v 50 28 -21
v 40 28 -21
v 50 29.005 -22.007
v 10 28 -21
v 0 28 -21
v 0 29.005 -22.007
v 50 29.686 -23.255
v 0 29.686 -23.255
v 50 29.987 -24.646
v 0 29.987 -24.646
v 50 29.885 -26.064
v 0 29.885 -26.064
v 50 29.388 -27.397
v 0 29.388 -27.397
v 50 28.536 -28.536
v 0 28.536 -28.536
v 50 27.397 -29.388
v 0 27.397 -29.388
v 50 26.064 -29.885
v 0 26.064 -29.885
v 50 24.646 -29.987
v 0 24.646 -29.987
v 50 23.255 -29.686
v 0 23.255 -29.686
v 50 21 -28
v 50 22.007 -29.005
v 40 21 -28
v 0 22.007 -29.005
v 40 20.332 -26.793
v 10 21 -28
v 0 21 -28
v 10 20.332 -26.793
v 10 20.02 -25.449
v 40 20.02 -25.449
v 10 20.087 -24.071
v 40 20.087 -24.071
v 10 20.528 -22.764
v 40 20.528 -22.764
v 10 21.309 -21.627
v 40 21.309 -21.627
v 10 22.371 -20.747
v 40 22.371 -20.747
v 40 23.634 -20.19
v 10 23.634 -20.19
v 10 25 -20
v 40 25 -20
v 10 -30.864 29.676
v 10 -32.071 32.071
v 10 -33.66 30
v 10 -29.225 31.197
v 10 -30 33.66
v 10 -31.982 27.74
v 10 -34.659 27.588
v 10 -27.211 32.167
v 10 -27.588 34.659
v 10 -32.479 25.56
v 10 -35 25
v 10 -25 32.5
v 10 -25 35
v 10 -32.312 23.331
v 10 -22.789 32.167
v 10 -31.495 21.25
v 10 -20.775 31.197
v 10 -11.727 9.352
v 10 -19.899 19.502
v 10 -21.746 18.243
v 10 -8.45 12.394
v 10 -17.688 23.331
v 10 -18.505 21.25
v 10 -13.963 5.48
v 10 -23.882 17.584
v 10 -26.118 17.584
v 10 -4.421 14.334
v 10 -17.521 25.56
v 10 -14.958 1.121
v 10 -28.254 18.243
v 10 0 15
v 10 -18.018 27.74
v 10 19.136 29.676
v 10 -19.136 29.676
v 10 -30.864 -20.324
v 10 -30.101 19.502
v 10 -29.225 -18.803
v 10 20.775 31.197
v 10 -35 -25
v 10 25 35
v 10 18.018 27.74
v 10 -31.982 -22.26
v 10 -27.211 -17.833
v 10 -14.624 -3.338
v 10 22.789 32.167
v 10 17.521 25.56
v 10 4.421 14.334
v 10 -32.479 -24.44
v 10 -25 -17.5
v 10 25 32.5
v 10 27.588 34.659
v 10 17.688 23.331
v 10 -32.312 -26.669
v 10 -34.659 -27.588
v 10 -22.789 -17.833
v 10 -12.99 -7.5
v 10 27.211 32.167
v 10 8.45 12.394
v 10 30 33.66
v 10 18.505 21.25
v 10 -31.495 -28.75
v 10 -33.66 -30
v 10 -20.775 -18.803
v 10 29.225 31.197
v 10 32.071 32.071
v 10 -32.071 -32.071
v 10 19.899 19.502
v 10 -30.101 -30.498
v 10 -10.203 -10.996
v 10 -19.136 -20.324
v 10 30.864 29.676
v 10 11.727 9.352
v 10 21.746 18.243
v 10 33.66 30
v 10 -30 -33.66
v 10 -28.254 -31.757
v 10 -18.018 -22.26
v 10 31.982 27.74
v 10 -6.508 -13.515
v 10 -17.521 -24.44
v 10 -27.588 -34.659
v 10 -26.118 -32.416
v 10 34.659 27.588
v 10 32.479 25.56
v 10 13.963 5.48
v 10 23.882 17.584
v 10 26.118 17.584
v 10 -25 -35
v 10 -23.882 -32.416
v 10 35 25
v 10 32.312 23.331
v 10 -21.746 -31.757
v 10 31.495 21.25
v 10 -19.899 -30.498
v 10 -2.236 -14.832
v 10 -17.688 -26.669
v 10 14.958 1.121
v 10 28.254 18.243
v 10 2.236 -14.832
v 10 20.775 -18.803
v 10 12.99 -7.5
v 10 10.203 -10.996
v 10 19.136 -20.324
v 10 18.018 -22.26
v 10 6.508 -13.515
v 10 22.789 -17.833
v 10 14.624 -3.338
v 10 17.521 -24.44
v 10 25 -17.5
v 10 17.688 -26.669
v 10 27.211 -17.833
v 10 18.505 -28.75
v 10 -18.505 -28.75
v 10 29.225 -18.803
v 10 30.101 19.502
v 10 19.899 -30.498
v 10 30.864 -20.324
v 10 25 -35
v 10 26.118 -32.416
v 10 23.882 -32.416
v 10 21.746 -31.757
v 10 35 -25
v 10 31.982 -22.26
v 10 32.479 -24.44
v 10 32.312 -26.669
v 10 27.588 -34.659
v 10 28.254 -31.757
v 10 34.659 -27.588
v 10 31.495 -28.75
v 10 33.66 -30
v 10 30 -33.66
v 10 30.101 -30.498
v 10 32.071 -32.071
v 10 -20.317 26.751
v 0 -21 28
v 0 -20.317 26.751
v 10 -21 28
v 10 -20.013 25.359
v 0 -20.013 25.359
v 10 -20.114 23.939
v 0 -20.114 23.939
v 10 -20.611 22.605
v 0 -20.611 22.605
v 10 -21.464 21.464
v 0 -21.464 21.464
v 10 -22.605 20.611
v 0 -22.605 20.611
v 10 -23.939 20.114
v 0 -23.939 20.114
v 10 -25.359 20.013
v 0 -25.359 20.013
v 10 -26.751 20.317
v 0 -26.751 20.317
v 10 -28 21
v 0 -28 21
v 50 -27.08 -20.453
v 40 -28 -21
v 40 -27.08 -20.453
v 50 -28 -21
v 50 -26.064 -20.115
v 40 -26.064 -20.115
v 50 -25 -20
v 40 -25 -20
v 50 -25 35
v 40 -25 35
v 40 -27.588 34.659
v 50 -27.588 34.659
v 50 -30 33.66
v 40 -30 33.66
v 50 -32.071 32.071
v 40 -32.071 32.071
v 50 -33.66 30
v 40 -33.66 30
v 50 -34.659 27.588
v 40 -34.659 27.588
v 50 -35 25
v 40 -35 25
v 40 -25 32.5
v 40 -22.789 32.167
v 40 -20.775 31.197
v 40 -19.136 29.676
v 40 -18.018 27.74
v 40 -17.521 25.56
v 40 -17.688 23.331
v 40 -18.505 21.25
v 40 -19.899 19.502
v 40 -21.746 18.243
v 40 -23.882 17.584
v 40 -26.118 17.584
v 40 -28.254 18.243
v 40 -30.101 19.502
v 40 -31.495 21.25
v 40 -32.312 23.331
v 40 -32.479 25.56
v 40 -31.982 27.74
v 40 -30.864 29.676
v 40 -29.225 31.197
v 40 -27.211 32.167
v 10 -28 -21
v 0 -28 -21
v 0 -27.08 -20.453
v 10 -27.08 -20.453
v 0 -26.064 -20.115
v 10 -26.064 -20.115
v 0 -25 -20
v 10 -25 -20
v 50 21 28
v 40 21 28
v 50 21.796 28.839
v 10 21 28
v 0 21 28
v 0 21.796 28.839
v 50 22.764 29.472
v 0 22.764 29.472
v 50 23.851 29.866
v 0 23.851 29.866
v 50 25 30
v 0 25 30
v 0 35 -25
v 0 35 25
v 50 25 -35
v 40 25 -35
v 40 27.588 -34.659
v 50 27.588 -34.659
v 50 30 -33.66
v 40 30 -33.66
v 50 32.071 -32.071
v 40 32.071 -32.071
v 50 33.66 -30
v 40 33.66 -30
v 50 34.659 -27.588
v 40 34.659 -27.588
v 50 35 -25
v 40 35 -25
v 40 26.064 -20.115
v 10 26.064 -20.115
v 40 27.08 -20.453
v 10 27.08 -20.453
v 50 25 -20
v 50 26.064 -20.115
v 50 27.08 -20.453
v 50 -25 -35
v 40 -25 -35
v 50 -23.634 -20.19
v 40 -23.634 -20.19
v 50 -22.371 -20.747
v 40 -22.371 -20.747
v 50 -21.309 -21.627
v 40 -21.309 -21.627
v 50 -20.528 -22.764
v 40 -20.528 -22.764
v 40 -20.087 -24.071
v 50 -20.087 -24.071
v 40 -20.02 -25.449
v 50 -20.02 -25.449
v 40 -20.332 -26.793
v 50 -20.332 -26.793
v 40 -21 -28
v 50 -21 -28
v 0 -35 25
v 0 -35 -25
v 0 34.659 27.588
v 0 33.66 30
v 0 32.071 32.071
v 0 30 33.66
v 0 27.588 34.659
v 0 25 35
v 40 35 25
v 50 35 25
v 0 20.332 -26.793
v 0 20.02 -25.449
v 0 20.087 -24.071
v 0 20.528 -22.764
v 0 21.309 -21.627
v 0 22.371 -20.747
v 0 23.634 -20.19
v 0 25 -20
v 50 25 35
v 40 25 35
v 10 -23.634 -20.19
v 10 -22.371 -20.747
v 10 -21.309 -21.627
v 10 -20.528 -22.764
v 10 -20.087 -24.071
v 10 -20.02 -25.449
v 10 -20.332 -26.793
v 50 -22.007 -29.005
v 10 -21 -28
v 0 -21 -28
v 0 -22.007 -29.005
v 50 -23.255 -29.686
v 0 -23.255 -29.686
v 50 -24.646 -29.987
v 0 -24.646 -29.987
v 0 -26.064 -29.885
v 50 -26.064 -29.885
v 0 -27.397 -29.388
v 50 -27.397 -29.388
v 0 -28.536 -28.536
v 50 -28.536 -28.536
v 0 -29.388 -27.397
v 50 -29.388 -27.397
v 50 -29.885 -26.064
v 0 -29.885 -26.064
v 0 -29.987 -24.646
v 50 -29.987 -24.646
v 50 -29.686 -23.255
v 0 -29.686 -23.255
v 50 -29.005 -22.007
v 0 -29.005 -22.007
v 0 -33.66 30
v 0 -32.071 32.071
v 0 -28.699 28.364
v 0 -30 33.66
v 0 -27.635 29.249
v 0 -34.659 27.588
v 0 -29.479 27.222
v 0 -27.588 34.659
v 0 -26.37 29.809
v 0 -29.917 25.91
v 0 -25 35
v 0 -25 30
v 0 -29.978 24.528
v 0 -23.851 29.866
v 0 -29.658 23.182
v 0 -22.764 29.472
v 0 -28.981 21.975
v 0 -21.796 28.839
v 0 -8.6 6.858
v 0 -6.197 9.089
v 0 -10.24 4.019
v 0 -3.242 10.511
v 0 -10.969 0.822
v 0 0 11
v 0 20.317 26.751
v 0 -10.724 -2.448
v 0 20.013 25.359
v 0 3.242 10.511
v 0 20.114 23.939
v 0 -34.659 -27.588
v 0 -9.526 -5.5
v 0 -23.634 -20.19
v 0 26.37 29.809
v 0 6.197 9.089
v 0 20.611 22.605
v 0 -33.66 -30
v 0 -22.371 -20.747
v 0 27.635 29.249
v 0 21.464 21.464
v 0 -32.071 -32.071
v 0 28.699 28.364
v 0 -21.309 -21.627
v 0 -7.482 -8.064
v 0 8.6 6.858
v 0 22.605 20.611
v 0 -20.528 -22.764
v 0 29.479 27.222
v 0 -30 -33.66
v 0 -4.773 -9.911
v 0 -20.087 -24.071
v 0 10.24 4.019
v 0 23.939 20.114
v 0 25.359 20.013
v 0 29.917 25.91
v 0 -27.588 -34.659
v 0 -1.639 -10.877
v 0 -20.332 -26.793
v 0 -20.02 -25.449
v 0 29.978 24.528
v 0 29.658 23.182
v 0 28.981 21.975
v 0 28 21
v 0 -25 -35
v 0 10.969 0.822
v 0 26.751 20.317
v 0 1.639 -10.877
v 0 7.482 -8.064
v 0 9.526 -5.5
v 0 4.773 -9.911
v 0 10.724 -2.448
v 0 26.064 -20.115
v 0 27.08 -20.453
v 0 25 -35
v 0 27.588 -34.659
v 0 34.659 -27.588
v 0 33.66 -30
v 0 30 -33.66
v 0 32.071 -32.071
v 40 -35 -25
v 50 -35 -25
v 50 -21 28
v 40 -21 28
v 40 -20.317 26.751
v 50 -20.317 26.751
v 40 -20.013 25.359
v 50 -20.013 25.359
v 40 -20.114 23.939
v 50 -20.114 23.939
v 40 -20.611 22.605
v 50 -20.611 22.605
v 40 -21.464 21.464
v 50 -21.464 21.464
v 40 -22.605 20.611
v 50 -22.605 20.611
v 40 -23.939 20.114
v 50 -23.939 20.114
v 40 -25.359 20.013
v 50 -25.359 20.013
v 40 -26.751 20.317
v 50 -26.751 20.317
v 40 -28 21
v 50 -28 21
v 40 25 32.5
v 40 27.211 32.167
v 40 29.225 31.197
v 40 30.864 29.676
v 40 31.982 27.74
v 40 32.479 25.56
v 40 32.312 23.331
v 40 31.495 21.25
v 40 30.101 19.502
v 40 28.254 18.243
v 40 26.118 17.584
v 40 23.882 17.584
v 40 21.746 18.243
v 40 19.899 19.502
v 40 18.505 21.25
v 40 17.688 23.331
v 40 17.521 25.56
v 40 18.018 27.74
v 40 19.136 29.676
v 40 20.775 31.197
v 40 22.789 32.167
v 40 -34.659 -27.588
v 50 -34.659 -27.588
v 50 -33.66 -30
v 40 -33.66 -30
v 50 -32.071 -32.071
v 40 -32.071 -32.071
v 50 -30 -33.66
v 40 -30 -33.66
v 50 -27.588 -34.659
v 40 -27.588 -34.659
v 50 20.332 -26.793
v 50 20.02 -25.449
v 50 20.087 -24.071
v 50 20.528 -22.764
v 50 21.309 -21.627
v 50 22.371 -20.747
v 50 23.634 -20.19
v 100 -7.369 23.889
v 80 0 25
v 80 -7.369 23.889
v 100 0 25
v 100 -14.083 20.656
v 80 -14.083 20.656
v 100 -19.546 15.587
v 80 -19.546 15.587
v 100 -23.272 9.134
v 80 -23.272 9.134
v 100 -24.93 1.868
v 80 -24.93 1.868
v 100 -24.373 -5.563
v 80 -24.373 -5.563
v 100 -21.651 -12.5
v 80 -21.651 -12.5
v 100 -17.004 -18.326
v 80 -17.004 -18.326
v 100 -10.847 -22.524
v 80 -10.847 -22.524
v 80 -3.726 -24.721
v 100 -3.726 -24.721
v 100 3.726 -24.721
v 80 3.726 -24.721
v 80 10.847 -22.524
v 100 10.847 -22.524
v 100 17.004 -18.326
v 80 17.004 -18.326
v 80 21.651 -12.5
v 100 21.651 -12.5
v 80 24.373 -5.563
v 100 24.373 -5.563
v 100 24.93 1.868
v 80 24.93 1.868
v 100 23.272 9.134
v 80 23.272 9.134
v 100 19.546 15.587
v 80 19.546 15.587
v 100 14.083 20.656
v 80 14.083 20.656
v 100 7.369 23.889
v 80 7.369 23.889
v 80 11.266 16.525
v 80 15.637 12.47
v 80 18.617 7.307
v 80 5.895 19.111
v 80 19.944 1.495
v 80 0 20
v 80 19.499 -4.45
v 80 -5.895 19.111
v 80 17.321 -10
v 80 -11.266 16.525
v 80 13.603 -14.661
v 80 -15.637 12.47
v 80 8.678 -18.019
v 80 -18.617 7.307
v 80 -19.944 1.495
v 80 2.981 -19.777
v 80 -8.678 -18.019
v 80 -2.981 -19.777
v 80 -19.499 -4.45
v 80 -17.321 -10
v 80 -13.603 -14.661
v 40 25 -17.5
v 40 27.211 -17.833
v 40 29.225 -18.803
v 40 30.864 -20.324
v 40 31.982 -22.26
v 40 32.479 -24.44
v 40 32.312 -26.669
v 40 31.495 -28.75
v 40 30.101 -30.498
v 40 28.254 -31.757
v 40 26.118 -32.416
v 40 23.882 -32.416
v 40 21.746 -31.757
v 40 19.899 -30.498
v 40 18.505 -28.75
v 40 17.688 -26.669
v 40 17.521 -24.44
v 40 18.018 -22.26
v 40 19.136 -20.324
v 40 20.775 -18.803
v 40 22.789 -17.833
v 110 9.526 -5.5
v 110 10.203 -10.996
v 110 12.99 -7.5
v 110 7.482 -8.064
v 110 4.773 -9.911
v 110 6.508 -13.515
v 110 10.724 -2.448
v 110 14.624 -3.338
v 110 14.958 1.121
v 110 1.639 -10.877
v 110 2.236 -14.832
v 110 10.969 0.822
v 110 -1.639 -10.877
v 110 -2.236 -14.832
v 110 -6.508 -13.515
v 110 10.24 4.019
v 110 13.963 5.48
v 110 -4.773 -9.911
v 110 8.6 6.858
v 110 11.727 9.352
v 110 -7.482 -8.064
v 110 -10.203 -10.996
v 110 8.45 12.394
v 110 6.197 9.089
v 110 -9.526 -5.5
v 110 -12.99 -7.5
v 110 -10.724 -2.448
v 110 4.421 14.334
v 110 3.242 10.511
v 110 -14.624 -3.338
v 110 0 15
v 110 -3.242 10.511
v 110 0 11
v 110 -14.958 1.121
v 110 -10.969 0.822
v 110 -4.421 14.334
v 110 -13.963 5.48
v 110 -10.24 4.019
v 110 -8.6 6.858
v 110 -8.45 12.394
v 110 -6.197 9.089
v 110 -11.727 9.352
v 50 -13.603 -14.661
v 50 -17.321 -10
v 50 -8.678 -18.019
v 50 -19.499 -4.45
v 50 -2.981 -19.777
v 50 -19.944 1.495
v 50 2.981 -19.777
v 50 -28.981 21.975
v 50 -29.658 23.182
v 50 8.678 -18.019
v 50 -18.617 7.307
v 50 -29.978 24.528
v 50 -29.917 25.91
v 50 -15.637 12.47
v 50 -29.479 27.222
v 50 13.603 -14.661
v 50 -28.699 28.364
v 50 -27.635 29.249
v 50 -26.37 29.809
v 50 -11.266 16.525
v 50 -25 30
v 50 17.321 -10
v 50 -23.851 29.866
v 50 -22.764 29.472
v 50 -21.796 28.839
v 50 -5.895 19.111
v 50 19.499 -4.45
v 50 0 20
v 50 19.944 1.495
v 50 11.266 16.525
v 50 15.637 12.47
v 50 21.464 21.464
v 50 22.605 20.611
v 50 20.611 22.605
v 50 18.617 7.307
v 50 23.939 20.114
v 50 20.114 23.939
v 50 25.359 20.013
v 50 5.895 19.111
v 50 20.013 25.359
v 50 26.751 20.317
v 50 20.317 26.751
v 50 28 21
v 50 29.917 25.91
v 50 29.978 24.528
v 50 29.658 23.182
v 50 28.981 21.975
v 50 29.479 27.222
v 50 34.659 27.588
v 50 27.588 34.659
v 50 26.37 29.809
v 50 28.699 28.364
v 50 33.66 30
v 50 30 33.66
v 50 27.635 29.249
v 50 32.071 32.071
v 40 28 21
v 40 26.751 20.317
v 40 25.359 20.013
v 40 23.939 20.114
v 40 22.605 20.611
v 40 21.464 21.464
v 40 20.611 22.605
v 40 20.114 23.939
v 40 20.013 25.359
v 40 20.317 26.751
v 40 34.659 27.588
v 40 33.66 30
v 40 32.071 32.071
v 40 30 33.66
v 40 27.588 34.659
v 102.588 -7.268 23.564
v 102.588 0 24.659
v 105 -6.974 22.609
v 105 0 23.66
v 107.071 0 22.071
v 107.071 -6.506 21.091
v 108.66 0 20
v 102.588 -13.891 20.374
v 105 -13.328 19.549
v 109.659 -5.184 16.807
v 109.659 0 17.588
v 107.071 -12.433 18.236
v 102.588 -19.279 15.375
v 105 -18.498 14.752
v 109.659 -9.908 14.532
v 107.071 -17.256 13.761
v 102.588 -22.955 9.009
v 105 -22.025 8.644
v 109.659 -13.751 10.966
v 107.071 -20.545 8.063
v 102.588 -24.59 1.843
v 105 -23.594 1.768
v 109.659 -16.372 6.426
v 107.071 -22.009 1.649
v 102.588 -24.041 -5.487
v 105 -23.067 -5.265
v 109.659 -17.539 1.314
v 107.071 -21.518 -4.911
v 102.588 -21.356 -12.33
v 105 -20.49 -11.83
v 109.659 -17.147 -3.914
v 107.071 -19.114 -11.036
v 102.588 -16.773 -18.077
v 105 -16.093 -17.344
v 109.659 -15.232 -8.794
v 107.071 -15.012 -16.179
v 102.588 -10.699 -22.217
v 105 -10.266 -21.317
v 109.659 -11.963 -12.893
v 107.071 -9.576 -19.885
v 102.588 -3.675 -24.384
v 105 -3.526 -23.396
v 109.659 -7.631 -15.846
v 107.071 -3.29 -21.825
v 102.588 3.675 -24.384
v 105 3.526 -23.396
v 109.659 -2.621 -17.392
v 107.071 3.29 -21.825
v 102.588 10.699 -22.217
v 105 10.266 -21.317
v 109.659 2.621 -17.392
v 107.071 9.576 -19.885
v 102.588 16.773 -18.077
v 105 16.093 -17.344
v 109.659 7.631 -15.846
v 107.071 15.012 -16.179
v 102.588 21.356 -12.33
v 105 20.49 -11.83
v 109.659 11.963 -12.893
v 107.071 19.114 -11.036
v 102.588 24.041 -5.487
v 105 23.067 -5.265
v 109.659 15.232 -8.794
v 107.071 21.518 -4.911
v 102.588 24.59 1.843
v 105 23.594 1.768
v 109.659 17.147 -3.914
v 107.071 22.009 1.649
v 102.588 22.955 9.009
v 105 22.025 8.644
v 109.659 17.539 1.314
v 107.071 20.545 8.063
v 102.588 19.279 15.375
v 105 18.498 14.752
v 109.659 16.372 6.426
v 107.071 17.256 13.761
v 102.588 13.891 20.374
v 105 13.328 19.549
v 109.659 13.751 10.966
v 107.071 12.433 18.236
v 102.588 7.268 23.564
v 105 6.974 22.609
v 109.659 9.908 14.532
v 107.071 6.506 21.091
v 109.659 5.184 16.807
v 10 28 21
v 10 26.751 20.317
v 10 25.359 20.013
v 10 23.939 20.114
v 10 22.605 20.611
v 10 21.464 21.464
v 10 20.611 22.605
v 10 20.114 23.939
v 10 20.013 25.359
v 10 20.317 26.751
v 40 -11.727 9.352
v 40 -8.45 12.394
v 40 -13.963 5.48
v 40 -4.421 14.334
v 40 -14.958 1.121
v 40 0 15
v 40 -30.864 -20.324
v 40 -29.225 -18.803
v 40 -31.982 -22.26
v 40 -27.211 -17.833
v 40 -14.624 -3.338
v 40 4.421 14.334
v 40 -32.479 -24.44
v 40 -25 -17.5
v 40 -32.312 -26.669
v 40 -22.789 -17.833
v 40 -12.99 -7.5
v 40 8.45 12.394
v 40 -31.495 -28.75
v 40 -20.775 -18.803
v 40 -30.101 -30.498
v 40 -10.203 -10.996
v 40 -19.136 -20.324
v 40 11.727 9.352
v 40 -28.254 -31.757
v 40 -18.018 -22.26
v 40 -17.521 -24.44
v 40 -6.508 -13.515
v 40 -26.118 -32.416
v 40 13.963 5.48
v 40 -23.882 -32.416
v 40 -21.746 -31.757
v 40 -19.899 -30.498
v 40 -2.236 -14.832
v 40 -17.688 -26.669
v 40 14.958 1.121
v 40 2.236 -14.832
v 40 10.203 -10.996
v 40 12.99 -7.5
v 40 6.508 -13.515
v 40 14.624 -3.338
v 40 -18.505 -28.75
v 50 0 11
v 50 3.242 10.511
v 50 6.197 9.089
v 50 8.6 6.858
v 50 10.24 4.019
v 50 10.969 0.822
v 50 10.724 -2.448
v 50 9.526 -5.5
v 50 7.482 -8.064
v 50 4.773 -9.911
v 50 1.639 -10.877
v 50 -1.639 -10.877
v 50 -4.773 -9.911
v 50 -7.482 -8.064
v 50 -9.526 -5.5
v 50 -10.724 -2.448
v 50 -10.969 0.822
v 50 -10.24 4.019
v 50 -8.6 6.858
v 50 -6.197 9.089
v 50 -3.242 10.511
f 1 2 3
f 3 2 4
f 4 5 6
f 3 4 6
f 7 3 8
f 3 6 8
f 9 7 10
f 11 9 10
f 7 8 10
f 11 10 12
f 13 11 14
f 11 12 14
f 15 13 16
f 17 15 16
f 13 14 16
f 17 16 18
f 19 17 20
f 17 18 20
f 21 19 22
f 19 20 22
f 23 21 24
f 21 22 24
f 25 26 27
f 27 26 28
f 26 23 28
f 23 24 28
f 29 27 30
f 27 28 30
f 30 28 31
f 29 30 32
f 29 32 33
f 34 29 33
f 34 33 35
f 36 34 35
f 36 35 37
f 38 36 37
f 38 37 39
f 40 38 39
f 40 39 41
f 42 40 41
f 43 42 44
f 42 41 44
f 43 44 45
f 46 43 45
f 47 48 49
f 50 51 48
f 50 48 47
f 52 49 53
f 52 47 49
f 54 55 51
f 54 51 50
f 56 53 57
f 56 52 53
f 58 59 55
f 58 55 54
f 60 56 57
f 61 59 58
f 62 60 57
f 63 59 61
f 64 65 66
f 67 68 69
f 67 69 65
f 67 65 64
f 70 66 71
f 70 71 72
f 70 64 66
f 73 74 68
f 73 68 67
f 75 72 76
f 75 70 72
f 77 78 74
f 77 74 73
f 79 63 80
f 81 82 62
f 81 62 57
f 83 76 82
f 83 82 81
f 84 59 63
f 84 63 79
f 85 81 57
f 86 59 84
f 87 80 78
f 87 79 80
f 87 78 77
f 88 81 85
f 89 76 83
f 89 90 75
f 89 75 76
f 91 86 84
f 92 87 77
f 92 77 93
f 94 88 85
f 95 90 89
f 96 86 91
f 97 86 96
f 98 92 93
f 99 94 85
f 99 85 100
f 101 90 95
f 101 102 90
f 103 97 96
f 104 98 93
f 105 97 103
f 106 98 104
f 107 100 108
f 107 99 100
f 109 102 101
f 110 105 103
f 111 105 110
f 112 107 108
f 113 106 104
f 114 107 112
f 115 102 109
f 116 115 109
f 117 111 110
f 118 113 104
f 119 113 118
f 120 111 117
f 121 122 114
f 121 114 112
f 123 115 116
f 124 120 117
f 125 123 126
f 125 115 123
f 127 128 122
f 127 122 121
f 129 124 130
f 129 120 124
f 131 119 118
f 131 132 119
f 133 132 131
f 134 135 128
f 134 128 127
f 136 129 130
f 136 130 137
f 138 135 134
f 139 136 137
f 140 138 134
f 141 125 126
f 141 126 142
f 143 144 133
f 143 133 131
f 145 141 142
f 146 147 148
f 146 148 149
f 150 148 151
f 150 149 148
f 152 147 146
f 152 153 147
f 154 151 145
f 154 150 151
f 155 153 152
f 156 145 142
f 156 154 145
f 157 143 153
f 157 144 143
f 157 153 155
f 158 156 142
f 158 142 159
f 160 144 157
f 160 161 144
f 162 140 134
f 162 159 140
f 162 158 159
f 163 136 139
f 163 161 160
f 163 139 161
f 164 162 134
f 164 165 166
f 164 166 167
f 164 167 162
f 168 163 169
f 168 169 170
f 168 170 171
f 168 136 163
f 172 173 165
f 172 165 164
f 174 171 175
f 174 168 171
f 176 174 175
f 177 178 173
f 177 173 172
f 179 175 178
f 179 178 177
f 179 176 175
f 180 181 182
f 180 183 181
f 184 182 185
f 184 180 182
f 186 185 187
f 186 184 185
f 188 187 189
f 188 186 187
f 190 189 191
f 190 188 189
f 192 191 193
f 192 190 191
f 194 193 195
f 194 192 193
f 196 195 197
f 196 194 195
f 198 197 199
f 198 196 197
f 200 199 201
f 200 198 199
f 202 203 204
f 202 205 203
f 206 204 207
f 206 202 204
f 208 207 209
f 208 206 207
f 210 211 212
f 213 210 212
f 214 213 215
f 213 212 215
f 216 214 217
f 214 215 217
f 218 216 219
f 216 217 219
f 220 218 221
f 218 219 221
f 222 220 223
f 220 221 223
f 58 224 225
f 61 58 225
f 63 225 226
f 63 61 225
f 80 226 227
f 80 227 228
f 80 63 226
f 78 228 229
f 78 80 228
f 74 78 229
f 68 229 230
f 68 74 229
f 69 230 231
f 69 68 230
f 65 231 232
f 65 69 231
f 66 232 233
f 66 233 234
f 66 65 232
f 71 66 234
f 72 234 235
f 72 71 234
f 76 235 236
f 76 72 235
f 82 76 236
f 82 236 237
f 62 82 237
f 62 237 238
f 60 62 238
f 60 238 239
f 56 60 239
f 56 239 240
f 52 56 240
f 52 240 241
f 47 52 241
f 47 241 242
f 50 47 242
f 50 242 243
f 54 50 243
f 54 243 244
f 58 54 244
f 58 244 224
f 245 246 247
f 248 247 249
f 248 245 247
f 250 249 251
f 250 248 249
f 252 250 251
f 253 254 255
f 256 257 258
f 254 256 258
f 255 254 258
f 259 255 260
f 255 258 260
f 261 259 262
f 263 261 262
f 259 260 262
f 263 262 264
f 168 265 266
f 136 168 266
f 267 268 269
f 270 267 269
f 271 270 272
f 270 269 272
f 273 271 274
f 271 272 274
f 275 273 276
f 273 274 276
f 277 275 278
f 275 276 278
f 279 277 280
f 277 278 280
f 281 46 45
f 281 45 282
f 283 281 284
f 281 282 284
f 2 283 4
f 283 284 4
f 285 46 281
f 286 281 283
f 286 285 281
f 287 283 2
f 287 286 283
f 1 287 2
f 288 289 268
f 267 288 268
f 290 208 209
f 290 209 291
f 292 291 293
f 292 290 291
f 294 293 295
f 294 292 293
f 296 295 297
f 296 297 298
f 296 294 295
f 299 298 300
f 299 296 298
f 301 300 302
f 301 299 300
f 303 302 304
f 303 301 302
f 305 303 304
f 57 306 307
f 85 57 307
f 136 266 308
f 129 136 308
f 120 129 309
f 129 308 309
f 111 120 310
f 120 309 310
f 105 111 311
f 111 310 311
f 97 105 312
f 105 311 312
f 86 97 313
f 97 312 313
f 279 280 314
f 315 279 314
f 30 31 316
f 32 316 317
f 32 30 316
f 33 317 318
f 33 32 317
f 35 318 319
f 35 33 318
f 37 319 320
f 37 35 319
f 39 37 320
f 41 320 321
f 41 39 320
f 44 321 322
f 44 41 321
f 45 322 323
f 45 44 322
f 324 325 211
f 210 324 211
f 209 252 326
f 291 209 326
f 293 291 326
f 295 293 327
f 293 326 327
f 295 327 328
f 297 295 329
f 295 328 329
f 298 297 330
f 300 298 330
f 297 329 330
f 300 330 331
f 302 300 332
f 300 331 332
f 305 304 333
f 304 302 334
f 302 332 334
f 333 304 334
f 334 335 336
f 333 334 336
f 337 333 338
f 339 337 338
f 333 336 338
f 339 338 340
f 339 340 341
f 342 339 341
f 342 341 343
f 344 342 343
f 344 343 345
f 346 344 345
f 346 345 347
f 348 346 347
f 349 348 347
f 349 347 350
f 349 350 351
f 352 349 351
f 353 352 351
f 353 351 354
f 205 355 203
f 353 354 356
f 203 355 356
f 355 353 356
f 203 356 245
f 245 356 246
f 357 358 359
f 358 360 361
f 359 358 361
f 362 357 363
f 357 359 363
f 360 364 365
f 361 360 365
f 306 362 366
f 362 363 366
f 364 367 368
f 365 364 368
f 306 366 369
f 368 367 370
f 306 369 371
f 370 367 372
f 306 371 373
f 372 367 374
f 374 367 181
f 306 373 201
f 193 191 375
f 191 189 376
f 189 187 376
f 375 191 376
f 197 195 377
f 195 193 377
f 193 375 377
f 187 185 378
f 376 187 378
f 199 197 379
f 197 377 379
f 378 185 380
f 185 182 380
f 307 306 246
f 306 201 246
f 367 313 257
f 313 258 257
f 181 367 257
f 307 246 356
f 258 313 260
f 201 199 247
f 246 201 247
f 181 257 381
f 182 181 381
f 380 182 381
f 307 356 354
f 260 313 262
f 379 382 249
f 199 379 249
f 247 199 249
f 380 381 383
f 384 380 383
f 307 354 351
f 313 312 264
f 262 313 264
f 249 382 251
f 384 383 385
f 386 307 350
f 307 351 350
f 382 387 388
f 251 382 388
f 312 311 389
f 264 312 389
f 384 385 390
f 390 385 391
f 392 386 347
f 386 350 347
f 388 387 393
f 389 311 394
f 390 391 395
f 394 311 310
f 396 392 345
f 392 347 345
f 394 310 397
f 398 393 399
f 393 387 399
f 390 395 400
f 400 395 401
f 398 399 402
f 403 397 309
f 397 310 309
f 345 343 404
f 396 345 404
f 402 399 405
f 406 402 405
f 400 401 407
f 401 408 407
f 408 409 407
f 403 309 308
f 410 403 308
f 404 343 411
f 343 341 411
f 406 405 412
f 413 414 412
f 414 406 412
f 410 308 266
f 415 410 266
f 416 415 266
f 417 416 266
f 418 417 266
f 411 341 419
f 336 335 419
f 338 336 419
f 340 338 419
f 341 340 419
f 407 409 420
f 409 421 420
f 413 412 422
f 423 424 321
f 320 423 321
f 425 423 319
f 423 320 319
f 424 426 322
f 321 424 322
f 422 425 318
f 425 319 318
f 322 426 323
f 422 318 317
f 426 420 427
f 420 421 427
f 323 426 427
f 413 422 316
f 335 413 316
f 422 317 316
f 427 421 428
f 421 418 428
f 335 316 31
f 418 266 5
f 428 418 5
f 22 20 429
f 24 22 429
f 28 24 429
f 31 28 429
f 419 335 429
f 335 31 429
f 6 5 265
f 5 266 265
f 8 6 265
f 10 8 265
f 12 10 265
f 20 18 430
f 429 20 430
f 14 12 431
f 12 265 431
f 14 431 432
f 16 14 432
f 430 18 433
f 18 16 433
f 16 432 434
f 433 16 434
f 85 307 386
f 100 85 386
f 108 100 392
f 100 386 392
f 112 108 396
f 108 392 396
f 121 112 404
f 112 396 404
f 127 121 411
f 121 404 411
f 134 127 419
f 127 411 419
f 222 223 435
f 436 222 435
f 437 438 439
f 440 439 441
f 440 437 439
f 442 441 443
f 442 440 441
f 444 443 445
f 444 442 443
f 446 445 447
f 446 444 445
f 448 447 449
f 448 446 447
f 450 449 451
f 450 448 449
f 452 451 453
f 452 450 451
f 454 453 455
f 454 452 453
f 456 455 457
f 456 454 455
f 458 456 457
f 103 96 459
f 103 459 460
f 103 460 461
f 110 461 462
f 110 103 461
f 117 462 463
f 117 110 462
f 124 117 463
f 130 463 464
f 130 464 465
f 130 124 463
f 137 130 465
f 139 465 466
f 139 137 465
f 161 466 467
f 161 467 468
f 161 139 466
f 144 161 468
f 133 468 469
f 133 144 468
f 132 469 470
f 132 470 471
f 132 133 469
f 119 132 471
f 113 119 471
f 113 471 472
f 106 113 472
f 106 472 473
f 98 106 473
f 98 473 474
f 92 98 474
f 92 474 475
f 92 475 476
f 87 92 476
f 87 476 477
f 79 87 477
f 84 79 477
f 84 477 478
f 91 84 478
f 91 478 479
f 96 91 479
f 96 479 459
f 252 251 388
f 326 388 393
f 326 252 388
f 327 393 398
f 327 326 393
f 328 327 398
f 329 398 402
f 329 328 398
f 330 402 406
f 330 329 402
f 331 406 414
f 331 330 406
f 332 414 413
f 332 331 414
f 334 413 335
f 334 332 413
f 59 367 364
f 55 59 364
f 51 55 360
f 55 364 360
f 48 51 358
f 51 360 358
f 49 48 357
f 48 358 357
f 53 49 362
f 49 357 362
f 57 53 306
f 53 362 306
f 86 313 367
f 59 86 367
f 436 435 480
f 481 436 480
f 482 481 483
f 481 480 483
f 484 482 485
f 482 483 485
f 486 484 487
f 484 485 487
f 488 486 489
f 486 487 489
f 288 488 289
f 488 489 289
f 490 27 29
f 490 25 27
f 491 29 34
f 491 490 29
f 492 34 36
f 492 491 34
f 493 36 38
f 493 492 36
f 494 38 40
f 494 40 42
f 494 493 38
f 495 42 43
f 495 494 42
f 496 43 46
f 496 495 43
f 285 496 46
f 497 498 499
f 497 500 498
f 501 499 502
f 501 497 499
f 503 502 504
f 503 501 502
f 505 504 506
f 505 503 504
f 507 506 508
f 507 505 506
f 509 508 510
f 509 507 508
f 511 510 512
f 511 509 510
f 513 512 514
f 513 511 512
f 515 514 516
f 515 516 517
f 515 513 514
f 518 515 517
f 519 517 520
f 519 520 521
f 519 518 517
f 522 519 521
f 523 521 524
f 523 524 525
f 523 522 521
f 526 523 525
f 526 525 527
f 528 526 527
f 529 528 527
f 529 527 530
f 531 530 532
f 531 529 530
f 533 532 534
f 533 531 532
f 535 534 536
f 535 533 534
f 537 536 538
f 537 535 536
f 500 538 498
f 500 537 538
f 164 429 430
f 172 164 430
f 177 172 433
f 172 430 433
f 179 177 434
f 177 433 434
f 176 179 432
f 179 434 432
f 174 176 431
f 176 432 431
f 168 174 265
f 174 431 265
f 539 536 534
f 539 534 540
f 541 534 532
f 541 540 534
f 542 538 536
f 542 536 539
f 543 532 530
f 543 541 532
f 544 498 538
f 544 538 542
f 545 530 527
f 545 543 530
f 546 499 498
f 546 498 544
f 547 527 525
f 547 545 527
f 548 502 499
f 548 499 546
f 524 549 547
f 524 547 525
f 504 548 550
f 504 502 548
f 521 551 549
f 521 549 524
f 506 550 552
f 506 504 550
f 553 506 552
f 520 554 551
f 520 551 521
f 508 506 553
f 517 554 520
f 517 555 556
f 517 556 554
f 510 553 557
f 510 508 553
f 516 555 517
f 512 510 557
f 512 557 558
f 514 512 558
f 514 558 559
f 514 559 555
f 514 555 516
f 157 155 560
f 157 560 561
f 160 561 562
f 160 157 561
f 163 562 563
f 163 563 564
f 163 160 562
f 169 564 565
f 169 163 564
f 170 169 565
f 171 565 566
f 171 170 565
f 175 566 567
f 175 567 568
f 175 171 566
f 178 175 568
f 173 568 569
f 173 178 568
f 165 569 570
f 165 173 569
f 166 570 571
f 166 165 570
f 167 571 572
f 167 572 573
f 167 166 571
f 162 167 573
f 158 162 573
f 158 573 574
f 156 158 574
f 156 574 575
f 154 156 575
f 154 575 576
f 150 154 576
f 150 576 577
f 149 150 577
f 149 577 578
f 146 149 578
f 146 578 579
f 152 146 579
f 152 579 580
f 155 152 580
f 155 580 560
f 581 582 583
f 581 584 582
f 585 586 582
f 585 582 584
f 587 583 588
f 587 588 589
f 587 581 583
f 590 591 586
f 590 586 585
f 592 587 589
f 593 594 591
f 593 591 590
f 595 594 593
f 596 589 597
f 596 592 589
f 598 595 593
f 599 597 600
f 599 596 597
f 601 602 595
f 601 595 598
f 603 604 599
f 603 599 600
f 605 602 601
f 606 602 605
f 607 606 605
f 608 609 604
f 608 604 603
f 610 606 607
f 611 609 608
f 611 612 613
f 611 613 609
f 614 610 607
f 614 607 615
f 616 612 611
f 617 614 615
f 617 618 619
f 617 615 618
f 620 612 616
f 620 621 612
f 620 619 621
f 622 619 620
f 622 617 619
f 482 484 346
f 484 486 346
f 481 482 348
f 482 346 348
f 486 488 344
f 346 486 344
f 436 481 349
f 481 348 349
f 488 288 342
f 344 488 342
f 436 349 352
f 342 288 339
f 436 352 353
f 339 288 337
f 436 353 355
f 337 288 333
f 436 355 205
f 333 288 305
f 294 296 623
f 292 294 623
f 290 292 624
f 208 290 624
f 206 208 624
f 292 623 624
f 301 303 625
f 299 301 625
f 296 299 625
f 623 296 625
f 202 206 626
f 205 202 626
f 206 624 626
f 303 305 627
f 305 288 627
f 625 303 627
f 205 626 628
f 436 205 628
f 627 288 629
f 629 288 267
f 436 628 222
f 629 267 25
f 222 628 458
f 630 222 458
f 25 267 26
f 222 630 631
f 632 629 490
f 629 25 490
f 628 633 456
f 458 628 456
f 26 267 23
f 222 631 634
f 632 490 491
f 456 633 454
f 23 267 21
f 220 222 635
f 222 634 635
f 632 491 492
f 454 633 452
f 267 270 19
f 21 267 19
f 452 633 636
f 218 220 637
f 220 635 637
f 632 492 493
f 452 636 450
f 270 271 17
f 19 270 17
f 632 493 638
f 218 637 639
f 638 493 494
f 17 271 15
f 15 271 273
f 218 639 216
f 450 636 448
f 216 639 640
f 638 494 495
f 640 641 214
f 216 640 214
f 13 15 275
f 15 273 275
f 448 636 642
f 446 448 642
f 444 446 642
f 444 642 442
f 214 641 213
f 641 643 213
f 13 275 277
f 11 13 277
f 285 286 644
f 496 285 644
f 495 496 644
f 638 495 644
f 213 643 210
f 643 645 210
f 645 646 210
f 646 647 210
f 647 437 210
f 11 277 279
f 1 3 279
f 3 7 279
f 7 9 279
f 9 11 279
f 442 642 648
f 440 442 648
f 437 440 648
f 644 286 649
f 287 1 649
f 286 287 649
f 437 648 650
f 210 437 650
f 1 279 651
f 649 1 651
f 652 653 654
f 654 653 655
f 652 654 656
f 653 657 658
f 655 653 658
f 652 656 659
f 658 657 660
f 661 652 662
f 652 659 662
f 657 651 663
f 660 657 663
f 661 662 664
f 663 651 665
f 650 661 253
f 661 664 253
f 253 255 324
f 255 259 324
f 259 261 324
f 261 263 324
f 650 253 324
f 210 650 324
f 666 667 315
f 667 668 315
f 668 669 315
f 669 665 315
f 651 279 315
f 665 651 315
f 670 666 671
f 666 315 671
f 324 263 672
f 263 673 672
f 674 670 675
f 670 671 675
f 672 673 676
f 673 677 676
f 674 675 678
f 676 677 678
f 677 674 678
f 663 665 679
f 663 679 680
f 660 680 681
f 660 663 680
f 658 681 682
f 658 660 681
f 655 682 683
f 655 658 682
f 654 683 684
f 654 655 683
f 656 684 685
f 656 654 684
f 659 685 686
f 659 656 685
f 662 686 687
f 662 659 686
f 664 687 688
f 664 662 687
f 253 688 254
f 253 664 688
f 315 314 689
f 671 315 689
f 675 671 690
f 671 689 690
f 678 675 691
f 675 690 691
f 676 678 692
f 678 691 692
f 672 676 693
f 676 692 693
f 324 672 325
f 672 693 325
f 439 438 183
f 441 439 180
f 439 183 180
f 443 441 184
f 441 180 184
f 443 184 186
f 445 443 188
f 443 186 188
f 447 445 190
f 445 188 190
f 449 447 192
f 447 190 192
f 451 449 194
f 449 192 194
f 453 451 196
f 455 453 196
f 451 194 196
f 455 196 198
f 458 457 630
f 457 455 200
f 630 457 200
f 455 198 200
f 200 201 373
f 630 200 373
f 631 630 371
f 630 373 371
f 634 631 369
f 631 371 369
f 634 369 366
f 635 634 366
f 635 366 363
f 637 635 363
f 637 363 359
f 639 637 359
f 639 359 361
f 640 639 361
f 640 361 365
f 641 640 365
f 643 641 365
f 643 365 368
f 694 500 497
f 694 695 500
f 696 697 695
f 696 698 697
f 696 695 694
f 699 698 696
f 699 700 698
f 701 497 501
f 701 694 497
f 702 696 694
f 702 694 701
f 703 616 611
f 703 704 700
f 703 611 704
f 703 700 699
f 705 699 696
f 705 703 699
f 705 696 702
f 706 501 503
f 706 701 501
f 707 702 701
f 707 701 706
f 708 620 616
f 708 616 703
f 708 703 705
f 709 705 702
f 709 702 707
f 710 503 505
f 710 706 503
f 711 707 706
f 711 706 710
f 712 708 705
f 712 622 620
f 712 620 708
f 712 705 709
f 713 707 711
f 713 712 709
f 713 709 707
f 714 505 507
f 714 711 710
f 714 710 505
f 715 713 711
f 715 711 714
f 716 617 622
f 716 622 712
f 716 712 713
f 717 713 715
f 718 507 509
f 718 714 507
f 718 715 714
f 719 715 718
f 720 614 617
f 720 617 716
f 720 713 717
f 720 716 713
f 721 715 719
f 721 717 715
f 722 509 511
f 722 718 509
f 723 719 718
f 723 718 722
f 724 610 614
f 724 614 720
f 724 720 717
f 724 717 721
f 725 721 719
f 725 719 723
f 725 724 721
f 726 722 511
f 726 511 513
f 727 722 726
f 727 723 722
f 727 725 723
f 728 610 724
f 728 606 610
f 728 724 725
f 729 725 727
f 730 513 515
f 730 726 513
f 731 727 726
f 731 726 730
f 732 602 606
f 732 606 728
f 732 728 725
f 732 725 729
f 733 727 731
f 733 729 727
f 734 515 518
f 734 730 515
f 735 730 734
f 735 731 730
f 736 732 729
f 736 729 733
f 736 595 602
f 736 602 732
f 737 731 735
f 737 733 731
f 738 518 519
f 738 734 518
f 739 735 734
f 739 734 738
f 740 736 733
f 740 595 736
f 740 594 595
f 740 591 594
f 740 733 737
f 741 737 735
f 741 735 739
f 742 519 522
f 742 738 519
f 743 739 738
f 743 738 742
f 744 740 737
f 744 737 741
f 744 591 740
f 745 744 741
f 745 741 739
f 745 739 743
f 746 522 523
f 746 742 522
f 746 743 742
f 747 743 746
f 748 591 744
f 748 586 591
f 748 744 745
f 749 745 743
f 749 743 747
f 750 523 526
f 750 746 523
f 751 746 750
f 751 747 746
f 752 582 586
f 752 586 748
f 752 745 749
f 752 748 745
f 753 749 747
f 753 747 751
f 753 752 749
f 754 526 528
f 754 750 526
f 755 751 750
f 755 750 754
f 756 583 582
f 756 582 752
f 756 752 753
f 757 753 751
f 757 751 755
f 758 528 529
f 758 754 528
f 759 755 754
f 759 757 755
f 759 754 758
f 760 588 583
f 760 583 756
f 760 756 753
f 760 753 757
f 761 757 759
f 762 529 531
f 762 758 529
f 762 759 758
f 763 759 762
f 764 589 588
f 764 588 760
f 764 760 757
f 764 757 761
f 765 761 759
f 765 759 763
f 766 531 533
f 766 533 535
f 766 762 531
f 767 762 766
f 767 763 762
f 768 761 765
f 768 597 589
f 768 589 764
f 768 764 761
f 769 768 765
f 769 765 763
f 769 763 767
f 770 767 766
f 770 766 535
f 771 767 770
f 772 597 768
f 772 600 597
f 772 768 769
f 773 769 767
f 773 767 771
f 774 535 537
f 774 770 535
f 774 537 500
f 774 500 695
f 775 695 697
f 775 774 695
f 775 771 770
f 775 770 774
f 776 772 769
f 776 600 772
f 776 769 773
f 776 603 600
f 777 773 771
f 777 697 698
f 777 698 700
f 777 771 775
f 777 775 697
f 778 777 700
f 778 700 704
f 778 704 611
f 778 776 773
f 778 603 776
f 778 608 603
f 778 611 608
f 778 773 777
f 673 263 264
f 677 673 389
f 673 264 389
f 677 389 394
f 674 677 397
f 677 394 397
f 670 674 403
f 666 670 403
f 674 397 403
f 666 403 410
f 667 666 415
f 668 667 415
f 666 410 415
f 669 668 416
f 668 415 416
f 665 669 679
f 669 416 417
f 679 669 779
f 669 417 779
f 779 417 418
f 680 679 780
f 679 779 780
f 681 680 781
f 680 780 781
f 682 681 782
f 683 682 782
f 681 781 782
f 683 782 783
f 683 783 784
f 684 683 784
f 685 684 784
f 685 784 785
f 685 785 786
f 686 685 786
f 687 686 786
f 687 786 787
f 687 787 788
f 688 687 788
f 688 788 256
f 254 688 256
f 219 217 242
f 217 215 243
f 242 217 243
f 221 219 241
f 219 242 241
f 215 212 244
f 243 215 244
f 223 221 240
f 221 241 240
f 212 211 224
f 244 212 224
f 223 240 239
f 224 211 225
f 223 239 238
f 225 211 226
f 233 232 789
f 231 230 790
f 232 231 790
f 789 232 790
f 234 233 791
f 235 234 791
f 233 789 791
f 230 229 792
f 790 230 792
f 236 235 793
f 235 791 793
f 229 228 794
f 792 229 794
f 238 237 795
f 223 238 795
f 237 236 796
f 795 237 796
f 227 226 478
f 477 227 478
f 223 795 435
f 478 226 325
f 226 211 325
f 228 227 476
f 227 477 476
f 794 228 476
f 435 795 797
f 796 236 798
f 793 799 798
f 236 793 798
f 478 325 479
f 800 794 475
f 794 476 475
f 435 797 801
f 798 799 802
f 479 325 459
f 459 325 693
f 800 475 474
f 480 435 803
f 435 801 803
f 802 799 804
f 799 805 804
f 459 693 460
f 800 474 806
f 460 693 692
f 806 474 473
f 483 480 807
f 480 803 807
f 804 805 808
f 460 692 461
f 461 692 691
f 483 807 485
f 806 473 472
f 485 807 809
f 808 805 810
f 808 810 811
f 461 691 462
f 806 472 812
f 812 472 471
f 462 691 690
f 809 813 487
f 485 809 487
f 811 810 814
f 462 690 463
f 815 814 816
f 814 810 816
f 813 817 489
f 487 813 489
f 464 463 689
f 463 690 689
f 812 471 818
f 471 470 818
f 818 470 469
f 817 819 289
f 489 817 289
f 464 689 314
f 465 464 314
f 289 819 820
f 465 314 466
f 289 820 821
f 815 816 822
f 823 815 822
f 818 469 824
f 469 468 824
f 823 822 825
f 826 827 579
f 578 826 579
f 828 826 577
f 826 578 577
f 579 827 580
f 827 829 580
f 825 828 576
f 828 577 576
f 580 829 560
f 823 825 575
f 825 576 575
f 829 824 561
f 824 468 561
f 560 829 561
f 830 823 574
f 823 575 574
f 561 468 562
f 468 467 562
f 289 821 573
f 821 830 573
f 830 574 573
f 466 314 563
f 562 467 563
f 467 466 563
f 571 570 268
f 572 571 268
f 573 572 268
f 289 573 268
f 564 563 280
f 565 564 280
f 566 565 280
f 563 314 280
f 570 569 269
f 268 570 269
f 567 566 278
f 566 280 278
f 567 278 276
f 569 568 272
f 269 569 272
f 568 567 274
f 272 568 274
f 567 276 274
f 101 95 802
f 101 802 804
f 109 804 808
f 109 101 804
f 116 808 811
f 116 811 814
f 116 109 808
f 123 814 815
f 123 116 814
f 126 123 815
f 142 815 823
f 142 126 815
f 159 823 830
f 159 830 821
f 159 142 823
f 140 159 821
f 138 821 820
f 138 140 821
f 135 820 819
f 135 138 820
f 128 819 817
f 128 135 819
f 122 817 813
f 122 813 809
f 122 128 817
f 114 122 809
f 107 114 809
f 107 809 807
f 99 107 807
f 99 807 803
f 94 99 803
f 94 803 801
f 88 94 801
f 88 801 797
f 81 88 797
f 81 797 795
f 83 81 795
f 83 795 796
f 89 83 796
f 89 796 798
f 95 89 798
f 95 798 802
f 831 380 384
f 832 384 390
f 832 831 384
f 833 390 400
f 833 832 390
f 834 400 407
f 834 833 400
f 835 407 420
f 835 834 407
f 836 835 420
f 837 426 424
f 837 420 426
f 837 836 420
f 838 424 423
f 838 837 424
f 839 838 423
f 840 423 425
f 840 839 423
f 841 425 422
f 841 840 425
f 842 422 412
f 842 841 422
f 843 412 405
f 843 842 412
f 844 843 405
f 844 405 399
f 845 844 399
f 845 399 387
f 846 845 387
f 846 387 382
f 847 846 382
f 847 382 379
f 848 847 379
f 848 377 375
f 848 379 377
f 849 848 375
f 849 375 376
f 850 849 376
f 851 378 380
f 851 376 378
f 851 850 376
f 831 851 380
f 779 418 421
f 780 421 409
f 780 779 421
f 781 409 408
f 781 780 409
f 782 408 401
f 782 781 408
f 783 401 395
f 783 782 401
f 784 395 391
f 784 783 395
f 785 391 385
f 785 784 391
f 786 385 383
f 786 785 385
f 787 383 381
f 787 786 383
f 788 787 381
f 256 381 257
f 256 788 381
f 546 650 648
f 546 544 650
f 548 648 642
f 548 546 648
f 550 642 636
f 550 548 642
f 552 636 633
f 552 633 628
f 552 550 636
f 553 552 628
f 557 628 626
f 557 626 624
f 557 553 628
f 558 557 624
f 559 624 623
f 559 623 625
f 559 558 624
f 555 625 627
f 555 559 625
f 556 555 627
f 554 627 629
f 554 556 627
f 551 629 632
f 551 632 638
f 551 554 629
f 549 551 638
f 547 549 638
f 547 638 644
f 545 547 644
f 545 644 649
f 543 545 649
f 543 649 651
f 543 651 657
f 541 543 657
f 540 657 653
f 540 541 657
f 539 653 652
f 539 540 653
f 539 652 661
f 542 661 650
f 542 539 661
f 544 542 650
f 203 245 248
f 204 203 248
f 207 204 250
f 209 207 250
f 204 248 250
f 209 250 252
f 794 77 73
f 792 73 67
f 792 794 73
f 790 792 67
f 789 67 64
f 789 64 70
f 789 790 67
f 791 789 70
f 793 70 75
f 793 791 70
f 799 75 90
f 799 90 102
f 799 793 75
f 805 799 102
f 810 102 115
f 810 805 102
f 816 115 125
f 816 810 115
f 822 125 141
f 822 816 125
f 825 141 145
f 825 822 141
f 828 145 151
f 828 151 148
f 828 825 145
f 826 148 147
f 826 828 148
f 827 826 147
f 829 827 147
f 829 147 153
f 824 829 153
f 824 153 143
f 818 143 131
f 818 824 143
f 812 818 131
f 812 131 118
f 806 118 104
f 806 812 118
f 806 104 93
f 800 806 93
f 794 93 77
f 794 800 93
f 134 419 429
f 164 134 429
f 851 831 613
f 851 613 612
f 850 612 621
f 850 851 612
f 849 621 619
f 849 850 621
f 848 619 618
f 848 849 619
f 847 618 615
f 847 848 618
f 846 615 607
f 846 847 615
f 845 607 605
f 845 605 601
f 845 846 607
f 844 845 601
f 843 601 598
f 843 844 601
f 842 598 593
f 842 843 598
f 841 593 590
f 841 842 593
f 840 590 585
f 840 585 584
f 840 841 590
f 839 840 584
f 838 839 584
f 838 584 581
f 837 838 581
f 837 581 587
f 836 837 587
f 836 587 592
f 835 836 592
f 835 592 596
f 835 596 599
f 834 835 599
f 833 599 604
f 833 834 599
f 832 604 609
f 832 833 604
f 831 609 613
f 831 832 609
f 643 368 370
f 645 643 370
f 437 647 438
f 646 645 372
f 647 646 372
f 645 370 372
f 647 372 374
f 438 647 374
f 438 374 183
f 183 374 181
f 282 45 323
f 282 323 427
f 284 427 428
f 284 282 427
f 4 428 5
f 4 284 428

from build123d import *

# Parameters (mm, degrees)
SKETCH_2_R               = 7.5
EXTRUDE_1_DEPTH          = 10
EXTRUDE_START            = -40
SKETCH_2_3_R             = 7.5
EXTRUDE_2_DEPTH          = 10
SKETCH_3_R               = 7.5
SKETCH_3_R_2             = 5
SKETCH_3_R_3             = 11
EXTRUDE_3_DEPTH          = 50
CUT_EXTRUDE_2_DEPTH      = 121.623380818
CUT_EXTRUDE_2_DEPTH_BACK = 121.623380818
SKETCH_6_R               = 5
SKETCH_6_R_2             = 11


with BuildPart() as part:
    # Эскиз1 → Повернуть1 (revolve)
    with BuildSketch(Plane.XY):
        with BuildLine():
            Line((0, -11), (0, -35))
            Line((0, -35), (10, -35))
            Line((10, -35), (10, -15))
            Line((10, -15), (40, -15))
            Line((40, -15), (40, -35))
            Line((40, -35), (50, -35))
            Line((50, -35), (50, -20))
            Line((50, -20), (80, -20))
            Line((80, -20), (80, -25))
            Line((80, -25), (100, -25))
            ThreePointArc((100, -25), (107.071067812, -22.071067812), (110, -15))
            Line((110, -15), (110, -11))
            Line((110, -11), (0, -11))
        make_face()
    revolve(axis=Axis((0, 0, 0), (1, 0, 0)))

    # Эскиз2 → Бобышка-Вытянуть1 (add)
    with BuildSketch(Plane.ZY):
        with BuildLine():
            Line((-25, 35), (25, 35))
            ThreePointArc((25, 35), (32.071067812, 32.071067812), (35, 25))
            Line((35, 25), (35, -25))
            ThreePointArc((35, -25), (32.071067812, -32.071067812), (25, -35))
            Line((25, -35), (-25, -35))
            ThreePointArc((-25, -35), (-32.071067812, -32.071067812), (-35, -25))
            Line((-35, -25), (-35, 25))
            ThreePointArc((-35, 25), (-32.071067812, 32.071067812), (-25, 35))
        make_face()
        with Locations((25, 25)):
            Circle(SKETCH_2_R, mode=Mode.SUBTRACT)
        with Locations((-25, 25)):
            Circle(SKETCH_2_R, mode=Mode.SUBTRACT)
        with Locations((-25, -25)):
            Circle(SKETCH_2_R, mode=Mode.SUBTRACT)
        with Locations((25, -25)):
            Circle(SKETCH_2_R, mode=Mode.SUBTRACT)
    extrude(amount=-EXTRUDE_1_DEPTH)

    # Эскиз2<3> → Бобышка-Вытянуть2 (add)
    with BuildSketch(Plane.ZY.offset(EXTRUDE_START)):
        with BuildLine():
            Line((-25, 35), (25, 35))
            ThreePointArc((25, 35), (32.071067812, 32.071067812), (35, 25))
            Line((35, 25), (35, -25))
            ThreePointArc((35, -25), (32.071067812, -32.071067812), (25, -35))
            Line((25, -35), (-25, -35))
            ThreePointArc((-25, -35), (-32.071067812, -32.071067812), (-35, -25))
            Line((-35, -25), (-35, 25))
            ThreePointArc((-35, 25), (-32.071067812, 32.071067812), (-25, 35))
        make_face()
        with Locations((25, 25)):
            Circle(SKETCH_2_3_R, mode=Mode.SUBTRACT)
        with Locations((-25, 25)):
            Circle(SKETCH_2_3_R, mode=Mode.SUBTRACT)
        with Locations((-25, -25)):
            Circle(SKETCH_2_3_R, mode=Mode.SUBTRACT)
        with Locations((25, -25)):
            Circle(SKETCH_2_3_R, mode=Mode.SUBTRACT)
    extrude(amount=-EXTRUDE_2_DEPTH)

    # Эскиз3 → Бобышка-Вытянуть3 (add)
    # profile 1 of 5: a face of its own
    with BuildSketch(Plane.ZY):
        with Locations((-25, 25)):
            Circle(SKETCH_3_R)
        with Locations((-25, 25)):
            Circle(SKETCH_3_R_2, mode=Mode.SUBTRACT)
    # profile 2 of 5: a face of its own
    with BuildSketch(Plane.ZY):
        with Locations((25, 25)):
            Circle(SKETCH_3_R)
        with Locations((25, 25)):
            Circle(SKETCH_3_R_2, mode=Mode.SUBTRACT)
    # profile 3 of 5: a face of its own
    with BuildSketch(Plane.ZY):
        with Locations((-25, -25)):
            Circle(SKETCH_3_R)
        with Locations((-25, -25)):
            Circle(SKETCH_3_R_2, mode=Mode.SUBTRACT)
    # profile 4 of 5: a face of its own
    with BuildSketch(Plane.ZY):
        with Locations((25, -25)):
            Circle(SKETCH_3_R)
        with Locations((25, -25)):
            Circle(SKETCH_3_R_2, mode=Mode.SUBTRACT)
    # profile 5 of 5: a face of its own
    with BuildSketch(Plane.ZY):
        Circle(SKETCH_3_R_3)
    extrude(amount=-EXTRUDE_3_DEPTH)

    # Эскиз6 → Вырез-Вытянуть2 (cut, two sides: drawn at the far end of the back side and taken through both)
    with BuildSketch(Plane.ZY.offset(-CUT_EXTRUDE_2_DEPTH_BACK)):
        with Locations((-25, 25)):
            Circle(SKETCH_6_R)
        with Locations((-25, -25)):
            Circle(SKETCH_6_R)
        with Locations((25, 25)):
            Circle(SKETCH_6_R)
        with Locations((25, -25)):
            Circle(SKETCH_6_R)
        Circle(SKETCH_6_R_2)
    extrude(amount=CUT_EXTRUDE_2_DEPTH + CUT_EXTRUDE_2_DEPTH_BACK, mode=Mode.SUBTRACT)


solid = part.part
